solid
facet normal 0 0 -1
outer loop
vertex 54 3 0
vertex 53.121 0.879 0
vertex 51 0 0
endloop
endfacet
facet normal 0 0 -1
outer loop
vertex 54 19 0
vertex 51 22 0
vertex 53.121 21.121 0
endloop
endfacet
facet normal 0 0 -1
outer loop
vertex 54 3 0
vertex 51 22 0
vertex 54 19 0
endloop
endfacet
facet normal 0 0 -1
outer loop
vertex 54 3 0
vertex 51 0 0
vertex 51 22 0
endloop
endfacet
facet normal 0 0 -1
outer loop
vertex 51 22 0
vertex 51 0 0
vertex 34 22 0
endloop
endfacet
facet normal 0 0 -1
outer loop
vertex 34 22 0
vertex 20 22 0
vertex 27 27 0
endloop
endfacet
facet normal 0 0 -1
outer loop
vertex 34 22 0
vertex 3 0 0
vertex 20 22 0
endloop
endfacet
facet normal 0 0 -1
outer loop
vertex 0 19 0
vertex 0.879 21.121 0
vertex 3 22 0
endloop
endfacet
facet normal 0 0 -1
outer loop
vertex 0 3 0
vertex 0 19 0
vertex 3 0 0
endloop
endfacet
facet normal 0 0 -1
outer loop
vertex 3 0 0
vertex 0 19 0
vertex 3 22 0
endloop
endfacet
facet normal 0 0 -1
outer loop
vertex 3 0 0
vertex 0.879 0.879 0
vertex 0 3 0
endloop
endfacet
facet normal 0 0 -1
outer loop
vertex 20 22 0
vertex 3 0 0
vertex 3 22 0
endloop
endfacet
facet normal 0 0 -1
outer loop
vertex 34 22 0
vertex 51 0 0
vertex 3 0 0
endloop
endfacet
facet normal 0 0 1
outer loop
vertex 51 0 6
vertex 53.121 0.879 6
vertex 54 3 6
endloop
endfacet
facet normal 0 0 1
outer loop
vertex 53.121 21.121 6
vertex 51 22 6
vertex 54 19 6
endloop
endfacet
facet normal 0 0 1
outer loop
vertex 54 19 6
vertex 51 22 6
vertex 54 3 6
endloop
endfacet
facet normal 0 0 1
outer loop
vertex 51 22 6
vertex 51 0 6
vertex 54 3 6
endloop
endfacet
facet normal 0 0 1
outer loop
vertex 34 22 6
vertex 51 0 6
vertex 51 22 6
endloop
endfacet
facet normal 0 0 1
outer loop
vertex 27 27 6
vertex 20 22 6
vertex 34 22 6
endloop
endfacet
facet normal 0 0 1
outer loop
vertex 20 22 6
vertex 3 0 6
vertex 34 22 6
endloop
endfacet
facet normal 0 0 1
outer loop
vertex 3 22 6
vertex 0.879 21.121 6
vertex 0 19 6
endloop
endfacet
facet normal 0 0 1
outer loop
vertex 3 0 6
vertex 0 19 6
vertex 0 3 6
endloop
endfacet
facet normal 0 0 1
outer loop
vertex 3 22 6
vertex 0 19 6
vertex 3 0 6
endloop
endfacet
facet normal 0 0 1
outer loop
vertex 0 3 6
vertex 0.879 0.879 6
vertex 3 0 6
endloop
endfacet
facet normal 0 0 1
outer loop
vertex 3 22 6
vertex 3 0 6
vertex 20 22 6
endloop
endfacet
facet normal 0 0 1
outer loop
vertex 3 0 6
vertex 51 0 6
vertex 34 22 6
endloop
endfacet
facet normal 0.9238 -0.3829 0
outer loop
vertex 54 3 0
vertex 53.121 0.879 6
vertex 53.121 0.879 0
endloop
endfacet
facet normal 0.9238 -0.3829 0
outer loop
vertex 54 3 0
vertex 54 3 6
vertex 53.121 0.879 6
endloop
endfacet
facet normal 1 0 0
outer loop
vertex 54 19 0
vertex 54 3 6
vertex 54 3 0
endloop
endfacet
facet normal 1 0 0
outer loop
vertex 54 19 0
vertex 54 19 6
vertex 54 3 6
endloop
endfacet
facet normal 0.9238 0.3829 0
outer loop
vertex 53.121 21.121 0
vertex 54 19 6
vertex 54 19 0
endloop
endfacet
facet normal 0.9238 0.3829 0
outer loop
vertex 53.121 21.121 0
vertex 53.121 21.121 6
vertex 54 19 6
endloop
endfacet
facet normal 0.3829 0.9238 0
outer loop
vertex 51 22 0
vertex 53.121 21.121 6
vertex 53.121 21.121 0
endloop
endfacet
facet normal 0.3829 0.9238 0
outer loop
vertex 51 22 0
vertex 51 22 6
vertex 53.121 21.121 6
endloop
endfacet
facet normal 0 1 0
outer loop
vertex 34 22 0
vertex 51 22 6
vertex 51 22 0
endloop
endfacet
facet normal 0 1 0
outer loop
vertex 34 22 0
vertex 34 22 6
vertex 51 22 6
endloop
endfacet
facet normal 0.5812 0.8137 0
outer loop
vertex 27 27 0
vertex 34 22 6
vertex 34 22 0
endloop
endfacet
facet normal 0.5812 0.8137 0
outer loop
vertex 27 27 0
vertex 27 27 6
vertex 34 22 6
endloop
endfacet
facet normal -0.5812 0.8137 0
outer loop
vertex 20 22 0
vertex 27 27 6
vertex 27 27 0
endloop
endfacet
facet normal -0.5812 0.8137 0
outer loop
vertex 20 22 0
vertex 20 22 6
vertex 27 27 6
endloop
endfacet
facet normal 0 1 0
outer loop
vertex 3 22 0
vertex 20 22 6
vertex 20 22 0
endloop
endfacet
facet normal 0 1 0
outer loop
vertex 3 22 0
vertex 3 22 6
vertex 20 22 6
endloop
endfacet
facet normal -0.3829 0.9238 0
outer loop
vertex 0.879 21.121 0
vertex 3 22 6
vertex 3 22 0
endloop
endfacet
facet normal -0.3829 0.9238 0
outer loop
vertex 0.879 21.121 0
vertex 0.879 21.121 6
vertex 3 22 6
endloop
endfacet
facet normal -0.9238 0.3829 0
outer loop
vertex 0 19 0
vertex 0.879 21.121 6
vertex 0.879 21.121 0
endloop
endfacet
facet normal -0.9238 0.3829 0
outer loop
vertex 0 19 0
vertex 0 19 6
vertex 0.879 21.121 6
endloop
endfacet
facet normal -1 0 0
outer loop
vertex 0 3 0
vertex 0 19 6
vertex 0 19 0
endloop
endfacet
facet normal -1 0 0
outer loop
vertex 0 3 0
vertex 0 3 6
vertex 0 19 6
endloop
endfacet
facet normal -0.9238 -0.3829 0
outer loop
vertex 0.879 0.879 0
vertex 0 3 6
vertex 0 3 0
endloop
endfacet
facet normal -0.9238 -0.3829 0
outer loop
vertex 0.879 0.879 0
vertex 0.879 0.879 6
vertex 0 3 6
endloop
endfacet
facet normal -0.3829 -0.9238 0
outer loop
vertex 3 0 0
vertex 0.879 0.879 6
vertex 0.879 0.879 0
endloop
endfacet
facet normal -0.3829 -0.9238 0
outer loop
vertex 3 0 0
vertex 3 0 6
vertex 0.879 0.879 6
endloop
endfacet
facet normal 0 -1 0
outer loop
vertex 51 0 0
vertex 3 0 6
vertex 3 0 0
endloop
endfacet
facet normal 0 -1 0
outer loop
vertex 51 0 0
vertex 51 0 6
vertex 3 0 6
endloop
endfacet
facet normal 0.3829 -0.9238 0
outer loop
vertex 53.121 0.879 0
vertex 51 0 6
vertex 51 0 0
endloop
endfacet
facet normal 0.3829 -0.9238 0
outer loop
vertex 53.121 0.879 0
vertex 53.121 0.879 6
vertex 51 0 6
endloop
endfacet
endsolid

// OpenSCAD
$fn = 32;

// ----------------------------------------------------------------------
// Ratchet pawl: 54 x 22 mm body, beak 5 mm сверху
// ----------------------------------------------------------------------

// --- parameters (mm) ---
profile_height = 6;       // extrusion height
profile_points = 15;      // points of the closed outline

profile = [[0, 3], [0.879, 0.879], [3, 0], [51, 0], [53.121, 0.879], [54, 3], [54, 19], [53.121, 21.121], [51, 22], [34, 22], [27, 27], [20, 22], [3, 22], [0.879, 21.121], [0, 19]];  // single closed polygon, 15 points, counter clockwise

// --- the one profile operation ---
linear_extrude(height = profile_height) polygon(points = profile);
